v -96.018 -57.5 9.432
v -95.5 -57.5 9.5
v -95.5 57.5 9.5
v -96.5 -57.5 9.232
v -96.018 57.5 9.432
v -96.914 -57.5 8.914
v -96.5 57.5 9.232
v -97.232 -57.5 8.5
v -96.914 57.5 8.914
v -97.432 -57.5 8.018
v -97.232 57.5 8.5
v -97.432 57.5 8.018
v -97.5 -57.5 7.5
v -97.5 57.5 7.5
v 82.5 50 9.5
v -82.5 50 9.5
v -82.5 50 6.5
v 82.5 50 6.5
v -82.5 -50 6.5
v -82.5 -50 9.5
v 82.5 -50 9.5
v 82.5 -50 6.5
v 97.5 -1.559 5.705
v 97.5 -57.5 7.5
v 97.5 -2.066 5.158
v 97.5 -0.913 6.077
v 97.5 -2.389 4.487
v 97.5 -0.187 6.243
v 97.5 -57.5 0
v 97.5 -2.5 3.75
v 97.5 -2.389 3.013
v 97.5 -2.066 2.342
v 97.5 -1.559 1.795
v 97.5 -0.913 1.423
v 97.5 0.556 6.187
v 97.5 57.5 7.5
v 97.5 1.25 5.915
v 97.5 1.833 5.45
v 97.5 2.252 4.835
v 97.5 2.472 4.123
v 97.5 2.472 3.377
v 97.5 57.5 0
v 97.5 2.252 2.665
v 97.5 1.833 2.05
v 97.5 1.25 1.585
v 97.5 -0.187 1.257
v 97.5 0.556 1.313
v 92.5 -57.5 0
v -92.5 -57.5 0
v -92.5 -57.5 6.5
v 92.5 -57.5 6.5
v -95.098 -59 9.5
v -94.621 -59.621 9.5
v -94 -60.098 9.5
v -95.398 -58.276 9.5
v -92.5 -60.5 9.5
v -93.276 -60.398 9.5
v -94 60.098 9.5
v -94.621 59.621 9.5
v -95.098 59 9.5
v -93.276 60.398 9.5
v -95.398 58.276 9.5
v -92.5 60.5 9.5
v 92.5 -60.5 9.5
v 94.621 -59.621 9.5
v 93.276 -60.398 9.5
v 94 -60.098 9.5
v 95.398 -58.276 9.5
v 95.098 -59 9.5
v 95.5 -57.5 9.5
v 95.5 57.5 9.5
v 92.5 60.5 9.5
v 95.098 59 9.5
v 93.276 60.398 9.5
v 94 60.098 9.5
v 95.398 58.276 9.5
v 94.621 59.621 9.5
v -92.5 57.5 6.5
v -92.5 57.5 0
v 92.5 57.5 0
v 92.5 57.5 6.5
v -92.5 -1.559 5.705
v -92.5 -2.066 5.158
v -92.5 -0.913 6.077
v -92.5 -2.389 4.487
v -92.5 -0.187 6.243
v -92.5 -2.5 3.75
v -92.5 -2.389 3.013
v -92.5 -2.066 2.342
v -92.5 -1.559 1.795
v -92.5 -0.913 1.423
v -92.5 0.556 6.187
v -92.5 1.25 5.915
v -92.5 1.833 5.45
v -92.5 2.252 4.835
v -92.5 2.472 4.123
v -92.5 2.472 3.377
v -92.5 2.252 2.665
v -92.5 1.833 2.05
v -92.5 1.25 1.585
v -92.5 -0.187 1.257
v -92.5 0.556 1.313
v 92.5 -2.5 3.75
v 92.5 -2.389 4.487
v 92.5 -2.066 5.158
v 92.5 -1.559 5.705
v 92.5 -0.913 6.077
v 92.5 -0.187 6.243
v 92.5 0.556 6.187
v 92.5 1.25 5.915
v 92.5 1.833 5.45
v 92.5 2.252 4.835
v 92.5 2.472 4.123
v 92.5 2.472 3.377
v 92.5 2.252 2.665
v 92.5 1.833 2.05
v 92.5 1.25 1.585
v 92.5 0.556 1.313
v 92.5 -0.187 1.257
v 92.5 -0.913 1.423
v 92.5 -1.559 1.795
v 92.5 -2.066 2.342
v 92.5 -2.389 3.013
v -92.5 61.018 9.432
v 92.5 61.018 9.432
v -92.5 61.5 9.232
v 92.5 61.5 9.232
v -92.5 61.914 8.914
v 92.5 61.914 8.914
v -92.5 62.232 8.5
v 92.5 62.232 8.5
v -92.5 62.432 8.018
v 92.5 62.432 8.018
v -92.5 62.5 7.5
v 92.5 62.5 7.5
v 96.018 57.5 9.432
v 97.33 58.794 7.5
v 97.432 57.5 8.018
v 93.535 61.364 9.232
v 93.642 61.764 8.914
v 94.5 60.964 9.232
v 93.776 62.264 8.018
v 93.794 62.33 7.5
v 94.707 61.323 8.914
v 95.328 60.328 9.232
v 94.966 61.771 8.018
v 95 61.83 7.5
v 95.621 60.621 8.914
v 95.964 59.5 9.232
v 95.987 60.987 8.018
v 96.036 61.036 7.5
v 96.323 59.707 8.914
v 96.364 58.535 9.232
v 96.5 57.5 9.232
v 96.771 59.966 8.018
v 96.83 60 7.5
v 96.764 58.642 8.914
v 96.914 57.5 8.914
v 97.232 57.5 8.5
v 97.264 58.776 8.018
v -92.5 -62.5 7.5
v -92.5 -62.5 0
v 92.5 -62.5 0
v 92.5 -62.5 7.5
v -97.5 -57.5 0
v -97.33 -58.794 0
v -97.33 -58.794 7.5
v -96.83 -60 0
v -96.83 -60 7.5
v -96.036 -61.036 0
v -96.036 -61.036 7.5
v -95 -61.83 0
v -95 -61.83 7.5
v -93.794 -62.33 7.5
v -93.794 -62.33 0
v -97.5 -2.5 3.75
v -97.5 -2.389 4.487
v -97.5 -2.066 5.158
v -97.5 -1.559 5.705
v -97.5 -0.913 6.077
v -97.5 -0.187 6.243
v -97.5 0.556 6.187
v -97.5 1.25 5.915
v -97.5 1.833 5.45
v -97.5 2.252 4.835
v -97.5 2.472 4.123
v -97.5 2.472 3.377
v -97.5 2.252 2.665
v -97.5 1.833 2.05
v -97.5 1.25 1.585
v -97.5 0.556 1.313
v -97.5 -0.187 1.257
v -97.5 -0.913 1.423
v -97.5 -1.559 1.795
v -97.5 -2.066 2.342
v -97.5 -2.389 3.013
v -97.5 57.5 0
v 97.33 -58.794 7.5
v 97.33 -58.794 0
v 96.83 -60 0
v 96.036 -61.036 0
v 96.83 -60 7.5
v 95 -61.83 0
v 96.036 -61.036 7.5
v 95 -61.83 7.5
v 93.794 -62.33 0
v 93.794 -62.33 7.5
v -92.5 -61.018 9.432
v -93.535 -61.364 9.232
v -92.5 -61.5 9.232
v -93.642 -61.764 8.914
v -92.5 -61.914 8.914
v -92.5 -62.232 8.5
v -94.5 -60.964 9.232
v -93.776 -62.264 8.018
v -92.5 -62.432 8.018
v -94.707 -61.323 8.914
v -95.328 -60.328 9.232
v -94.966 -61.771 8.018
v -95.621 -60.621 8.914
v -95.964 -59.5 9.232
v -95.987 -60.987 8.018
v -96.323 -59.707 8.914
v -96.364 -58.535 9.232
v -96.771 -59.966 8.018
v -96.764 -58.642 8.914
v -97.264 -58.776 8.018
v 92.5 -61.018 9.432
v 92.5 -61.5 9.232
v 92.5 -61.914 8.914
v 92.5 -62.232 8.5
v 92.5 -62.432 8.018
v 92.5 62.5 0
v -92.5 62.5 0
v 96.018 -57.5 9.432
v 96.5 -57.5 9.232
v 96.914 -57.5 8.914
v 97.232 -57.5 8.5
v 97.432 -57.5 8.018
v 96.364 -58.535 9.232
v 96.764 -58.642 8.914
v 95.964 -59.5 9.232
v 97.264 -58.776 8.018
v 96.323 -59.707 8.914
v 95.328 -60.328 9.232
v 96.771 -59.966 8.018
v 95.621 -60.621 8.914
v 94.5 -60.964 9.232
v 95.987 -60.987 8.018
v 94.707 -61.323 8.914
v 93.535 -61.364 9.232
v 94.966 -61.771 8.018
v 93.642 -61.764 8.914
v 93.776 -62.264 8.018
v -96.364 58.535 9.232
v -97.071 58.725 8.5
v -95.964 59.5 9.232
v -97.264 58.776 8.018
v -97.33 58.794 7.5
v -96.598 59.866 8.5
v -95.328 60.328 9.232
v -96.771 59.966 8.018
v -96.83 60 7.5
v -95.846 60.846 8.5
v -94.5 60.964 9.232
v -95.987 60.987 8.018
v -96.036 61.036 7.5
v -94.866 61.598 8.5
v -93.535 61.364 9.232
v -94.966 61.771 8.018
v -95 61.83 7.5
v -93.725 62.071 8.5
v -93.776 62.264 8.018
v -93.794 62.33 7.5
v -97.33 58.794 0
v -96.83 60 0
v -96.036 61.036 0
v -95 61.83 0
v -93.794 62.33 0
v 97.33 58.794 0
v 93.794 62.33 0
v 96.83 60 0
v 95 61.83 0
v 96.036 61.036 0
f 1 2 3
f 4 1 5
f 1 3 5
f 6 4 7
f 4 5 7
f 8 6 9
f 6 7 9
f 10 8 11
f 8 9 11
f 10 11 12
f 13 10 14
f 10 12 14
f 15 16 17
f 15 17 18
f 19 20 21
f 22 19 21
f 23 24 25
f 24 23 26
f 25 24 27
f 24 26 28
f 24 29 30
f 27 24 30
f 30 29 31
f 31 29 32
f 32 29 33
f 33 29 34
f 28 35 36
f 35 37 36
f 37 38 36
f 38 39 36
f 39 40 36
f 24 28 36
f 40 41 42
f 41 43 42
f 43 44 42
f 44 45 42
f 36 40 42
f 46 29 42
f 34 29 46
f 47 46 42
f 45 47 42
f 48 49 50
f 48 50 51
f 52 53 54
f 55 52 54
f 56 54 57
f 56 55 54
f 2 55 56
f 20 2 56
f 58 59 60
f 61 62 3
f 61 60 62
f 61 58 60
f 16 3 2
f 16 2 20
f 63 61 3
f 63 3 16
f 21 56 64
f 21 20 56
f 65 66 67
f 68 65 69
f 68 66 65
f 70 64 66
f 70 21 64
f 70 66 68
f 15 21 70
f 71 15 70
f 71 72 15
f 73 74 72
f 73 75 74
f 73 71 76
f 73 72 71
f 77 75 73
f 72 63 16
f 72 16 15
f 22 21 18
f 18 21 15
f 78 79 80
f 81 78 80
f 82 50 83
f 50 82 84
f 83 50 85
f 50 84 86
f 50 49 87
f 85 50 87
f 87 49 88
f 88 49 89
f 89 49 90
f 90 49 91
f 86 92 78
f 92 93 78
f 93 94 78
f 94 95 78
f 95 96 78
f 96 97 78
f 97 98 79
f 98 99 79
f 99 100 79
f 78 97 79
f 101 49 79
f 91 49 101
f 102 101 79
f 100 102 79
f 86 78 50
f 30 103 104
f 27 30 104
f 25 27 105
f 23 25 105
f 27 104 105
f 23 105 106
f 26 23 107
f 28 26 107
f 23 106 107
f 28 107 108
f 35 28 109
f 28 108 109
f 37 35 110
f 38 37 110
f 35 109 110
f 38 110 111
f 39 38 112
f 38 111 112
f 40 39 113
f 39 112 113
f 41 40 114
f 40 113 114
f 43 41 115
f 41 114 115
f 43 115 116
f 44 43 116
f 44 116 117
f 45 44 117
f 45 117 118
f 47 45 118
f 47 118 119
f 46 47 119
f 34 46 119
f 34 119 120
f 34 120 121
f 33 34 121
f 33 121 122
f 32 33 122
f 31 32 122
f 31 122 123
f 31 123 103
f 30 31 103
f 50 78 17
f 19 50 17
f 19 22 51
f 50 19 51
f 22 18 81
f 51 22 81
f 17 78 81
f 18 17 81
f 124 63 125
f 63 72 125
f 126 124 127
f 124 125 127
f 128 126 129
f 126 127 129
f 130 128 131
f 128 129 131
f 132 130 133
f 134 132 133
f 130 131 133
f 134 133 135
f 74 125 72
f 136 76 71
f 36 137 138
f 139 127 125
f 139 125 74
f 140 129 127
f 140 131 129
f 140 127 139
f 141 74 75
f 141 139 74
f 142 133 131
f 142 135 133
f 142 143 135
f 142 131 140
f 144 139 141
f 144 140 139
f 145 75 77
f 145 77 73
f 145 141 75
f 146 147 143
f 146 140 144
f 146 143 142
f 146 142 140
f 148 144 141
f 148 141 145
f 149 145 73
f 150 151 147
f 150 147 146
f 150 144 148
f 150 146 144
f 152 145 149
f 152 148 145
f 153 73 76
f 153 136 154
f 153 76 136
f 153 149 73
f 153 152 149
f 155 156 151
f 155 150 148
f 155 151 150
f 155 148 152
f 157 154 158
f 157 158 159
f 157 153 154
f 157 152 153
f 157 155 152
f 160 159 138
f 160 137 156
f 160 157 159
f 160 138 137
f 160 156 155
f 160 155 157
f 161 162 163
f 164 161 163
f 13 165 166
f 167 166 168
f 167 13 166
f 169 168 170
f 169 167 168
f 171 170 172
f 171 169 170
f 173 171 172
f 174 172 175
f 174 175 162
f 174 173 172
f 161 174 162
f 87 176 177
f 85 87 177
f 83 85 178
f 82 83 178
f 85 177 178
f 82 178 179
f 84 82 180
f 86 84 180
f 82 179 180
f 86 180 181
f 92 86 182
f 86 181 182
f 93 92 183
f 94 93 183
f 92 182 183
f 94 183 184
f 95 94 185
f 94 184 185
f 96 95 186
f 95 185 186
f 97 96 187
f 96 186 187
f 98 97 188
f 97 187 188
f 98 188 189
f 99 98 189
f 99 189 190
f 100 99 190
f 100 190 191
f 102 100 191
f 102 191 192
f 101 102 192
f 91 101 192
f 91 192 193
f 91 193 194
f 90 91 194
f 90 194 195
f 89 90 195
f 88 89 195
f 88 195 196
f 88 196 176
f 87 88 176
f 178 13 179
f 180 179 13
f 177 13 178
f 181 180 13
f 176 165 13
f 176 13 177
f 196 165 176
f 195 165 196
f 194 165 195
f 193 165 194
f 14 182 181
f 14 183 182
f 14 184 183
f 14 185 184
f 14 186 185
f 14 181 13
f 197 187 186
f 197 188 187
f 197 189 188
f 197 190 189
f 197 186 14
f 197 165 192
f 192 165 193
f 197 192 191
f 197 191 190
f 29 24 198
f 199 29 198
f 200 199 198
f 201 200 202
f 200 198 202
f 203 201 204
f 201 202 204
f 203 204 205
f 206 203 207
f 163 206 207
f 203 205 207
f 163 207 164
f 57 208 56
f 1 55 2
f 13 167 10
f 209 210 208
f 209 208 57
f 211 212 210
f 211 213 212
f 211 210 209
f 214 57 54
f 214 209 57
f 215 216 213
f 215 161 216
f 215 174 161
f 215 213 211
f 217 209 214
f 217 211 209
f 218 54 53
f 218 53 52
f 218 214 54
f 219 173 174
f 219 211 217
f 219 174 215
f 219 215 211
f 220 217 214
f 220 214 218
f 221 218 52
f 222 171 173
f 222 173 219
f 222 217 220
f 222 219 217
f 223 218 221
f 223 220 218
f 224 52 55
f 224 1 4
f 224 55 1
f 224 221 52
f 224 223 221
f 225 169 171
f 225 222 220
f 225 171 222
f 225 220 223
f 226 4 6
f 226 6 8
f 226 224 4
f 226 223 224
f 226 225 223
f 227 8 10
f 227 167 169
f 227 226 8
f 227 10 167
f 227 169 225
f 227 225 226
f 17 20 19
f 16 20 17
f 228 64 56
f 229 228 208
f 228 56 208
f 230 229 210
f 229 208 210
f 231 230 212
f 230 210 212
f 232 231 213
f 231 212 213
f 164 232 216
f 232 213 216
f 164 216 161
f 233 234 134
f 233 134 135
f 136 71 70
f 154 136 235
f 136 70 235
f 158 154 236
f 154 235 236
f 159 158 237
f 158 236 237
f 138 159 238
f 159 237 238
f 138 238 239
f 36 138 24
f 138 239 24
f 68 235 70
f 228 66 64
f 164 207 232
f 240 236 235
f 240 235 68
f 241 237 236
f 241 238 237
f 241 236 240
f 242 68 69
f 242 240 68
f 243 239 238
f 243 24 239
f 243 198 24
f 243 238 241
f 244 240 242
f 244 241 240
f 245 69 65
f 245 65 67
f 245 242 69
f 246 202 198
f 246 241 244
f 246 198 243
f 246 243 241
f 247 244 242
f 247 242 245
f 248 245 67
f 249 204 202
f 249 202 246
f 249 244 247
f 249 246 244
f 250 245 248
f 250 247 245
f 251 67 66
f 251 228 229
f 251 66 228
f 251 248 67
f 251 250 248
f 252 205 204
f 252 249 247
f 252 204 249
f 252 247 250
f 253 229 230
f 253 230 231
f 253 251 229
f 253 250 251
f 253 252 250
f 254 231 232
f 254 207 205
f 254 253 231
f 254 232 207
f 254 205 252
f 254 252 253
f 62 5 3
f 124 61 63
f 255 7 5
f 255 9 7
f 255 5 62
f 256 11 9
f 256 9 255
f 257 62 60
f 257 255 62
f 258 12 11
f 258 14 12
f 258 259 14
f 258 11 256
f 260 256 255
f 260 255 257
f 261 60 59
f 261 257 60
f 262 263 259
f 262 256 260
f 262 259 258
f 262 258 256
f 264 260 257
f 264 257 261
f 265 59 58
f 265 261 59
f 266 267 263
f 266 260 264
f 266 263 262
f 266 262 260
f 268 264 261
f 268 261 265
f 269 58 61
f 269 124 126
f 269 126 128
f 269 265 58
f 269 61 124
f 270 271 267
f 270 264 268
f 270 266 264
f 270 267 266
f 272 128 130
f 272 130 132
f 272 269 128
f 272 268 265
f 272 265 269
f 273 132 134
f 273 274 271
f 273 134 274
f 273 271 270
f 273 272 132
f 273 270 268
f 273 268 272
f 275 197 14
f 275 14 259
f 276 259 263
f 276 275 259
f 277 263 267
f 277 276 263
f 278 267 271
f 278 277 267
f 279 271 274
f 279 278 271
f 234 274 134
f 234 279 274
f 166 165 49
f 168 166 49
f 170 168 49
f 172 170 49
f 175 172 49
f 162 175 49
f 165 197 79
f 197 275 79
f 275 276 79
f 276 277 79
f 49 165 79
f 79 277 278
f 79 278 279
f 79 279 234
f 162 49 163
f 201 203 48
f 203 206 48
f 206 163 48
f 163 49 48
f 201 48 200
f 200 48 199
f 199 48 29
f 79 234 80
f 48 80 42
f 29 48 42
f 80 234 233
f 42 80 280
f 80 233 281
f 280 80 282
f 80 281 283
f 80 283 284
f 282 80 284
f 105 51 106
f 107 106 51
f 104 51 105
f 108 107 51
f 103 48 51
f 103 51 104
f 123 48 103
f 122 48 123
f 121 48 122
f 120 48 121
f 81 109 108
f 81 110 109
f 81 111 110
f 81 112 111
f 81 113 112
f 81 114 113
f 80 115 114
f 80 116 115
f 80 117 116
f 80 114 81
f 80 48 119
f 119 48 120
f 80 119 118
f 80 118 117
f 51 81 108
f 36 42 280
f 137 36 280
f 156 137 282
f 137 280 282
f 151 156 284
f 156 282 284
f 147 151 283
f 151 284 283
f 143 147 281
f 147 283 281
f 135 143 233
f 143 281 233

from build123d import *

# Parameters (mm, degrees)
SKETCH2_W           = 195
SKETCH2_H           = 125
SKETCH2_W_2         = 185
SKETCH2_H_2         = 115
BOSS_EXTRUDE1_DEPTH = 9.5
SKETCH3_W           = 195
SKETCH3_H           = 125
SKETCH3_W_2         = 165
SKETCH3_H_2         = 100
BOSS_EXTRUDE2_DEPTH = 3
FILLET1_R           = 5
FILLET2_R           = 2
SKETCH4_R           = 2.5
CUT_EXTRUDE1_DEPTH  = 205.991463237


with BuildPart() as part:
    # Sketch2 → Boss-Extrude1 (new body)
    with BuildSketch(Plane.XY):
        Rectangle(SKETCH2_W, SKETCH2_H)
        Rectangle(SKETCH2_W_2, SKETCH2_H_2, mode=Mode.SUBTRACT)
    extrude(amount=BOSS_EXTRUDE1_DEPTH)

    # Sketch3 → Boss-Extrude2 (add)
    with BuildSketch(Plane.XY.offset(9.5)):
        Rectangle(SKETCH3_W, SKETCH3_H)
        Rectangle(SKETCH3_W_2, SKETCH3_H_2, mode=Mode.SUBTRACT)
    extrude(amount=-BOSS_EXTRUDE2_DEPTH)

    # Fillet1
    fillet1_edges = [part.edges().sort_by_distance(p)[0] for p in [
        (-97.5, 62.5, 4.75),
        (97.5, 62.5, 4.75),
        (97.5, -62.5, 4.75),
        (-97.5, -62.5, 4.75),
    ]]
    fillet(fillet1_edges, radius=FILLET1_R)

    # Fillet2
    fillet2_edges = [part.edges().sort_by_distance(p)[0] for p in [
        (0, 62.5, 9.5),
        (-96.035533906, 61.035533906, 9.5),
        (96.035533906, 61.035533906, 9.5),
        (-97.5, 0, 9.5),
        (97.5, 0, 9.5),
        (-96.035533906, -61.035533906, 9.5),
        (96.035533906, -61.035533906, 9.5),
        (0, -62.5, 9.5),
    ]]
    fillet(fillet2_edges, radius=FILLET2_R)

    # Sketch4 → Cut-Extrude1 (cut, through all)
    with BuildSketch(Plane.ZY.offset(97.5)):
        with Locations(Location((3.75, 0, 0), (0, 0, 270))):
            Circle(SKETCH4_R)
    extrude(amount=-CUT_EXTRUDE1_DEPTH, mode=Mode.SUBTRACT)


solid = part.part
